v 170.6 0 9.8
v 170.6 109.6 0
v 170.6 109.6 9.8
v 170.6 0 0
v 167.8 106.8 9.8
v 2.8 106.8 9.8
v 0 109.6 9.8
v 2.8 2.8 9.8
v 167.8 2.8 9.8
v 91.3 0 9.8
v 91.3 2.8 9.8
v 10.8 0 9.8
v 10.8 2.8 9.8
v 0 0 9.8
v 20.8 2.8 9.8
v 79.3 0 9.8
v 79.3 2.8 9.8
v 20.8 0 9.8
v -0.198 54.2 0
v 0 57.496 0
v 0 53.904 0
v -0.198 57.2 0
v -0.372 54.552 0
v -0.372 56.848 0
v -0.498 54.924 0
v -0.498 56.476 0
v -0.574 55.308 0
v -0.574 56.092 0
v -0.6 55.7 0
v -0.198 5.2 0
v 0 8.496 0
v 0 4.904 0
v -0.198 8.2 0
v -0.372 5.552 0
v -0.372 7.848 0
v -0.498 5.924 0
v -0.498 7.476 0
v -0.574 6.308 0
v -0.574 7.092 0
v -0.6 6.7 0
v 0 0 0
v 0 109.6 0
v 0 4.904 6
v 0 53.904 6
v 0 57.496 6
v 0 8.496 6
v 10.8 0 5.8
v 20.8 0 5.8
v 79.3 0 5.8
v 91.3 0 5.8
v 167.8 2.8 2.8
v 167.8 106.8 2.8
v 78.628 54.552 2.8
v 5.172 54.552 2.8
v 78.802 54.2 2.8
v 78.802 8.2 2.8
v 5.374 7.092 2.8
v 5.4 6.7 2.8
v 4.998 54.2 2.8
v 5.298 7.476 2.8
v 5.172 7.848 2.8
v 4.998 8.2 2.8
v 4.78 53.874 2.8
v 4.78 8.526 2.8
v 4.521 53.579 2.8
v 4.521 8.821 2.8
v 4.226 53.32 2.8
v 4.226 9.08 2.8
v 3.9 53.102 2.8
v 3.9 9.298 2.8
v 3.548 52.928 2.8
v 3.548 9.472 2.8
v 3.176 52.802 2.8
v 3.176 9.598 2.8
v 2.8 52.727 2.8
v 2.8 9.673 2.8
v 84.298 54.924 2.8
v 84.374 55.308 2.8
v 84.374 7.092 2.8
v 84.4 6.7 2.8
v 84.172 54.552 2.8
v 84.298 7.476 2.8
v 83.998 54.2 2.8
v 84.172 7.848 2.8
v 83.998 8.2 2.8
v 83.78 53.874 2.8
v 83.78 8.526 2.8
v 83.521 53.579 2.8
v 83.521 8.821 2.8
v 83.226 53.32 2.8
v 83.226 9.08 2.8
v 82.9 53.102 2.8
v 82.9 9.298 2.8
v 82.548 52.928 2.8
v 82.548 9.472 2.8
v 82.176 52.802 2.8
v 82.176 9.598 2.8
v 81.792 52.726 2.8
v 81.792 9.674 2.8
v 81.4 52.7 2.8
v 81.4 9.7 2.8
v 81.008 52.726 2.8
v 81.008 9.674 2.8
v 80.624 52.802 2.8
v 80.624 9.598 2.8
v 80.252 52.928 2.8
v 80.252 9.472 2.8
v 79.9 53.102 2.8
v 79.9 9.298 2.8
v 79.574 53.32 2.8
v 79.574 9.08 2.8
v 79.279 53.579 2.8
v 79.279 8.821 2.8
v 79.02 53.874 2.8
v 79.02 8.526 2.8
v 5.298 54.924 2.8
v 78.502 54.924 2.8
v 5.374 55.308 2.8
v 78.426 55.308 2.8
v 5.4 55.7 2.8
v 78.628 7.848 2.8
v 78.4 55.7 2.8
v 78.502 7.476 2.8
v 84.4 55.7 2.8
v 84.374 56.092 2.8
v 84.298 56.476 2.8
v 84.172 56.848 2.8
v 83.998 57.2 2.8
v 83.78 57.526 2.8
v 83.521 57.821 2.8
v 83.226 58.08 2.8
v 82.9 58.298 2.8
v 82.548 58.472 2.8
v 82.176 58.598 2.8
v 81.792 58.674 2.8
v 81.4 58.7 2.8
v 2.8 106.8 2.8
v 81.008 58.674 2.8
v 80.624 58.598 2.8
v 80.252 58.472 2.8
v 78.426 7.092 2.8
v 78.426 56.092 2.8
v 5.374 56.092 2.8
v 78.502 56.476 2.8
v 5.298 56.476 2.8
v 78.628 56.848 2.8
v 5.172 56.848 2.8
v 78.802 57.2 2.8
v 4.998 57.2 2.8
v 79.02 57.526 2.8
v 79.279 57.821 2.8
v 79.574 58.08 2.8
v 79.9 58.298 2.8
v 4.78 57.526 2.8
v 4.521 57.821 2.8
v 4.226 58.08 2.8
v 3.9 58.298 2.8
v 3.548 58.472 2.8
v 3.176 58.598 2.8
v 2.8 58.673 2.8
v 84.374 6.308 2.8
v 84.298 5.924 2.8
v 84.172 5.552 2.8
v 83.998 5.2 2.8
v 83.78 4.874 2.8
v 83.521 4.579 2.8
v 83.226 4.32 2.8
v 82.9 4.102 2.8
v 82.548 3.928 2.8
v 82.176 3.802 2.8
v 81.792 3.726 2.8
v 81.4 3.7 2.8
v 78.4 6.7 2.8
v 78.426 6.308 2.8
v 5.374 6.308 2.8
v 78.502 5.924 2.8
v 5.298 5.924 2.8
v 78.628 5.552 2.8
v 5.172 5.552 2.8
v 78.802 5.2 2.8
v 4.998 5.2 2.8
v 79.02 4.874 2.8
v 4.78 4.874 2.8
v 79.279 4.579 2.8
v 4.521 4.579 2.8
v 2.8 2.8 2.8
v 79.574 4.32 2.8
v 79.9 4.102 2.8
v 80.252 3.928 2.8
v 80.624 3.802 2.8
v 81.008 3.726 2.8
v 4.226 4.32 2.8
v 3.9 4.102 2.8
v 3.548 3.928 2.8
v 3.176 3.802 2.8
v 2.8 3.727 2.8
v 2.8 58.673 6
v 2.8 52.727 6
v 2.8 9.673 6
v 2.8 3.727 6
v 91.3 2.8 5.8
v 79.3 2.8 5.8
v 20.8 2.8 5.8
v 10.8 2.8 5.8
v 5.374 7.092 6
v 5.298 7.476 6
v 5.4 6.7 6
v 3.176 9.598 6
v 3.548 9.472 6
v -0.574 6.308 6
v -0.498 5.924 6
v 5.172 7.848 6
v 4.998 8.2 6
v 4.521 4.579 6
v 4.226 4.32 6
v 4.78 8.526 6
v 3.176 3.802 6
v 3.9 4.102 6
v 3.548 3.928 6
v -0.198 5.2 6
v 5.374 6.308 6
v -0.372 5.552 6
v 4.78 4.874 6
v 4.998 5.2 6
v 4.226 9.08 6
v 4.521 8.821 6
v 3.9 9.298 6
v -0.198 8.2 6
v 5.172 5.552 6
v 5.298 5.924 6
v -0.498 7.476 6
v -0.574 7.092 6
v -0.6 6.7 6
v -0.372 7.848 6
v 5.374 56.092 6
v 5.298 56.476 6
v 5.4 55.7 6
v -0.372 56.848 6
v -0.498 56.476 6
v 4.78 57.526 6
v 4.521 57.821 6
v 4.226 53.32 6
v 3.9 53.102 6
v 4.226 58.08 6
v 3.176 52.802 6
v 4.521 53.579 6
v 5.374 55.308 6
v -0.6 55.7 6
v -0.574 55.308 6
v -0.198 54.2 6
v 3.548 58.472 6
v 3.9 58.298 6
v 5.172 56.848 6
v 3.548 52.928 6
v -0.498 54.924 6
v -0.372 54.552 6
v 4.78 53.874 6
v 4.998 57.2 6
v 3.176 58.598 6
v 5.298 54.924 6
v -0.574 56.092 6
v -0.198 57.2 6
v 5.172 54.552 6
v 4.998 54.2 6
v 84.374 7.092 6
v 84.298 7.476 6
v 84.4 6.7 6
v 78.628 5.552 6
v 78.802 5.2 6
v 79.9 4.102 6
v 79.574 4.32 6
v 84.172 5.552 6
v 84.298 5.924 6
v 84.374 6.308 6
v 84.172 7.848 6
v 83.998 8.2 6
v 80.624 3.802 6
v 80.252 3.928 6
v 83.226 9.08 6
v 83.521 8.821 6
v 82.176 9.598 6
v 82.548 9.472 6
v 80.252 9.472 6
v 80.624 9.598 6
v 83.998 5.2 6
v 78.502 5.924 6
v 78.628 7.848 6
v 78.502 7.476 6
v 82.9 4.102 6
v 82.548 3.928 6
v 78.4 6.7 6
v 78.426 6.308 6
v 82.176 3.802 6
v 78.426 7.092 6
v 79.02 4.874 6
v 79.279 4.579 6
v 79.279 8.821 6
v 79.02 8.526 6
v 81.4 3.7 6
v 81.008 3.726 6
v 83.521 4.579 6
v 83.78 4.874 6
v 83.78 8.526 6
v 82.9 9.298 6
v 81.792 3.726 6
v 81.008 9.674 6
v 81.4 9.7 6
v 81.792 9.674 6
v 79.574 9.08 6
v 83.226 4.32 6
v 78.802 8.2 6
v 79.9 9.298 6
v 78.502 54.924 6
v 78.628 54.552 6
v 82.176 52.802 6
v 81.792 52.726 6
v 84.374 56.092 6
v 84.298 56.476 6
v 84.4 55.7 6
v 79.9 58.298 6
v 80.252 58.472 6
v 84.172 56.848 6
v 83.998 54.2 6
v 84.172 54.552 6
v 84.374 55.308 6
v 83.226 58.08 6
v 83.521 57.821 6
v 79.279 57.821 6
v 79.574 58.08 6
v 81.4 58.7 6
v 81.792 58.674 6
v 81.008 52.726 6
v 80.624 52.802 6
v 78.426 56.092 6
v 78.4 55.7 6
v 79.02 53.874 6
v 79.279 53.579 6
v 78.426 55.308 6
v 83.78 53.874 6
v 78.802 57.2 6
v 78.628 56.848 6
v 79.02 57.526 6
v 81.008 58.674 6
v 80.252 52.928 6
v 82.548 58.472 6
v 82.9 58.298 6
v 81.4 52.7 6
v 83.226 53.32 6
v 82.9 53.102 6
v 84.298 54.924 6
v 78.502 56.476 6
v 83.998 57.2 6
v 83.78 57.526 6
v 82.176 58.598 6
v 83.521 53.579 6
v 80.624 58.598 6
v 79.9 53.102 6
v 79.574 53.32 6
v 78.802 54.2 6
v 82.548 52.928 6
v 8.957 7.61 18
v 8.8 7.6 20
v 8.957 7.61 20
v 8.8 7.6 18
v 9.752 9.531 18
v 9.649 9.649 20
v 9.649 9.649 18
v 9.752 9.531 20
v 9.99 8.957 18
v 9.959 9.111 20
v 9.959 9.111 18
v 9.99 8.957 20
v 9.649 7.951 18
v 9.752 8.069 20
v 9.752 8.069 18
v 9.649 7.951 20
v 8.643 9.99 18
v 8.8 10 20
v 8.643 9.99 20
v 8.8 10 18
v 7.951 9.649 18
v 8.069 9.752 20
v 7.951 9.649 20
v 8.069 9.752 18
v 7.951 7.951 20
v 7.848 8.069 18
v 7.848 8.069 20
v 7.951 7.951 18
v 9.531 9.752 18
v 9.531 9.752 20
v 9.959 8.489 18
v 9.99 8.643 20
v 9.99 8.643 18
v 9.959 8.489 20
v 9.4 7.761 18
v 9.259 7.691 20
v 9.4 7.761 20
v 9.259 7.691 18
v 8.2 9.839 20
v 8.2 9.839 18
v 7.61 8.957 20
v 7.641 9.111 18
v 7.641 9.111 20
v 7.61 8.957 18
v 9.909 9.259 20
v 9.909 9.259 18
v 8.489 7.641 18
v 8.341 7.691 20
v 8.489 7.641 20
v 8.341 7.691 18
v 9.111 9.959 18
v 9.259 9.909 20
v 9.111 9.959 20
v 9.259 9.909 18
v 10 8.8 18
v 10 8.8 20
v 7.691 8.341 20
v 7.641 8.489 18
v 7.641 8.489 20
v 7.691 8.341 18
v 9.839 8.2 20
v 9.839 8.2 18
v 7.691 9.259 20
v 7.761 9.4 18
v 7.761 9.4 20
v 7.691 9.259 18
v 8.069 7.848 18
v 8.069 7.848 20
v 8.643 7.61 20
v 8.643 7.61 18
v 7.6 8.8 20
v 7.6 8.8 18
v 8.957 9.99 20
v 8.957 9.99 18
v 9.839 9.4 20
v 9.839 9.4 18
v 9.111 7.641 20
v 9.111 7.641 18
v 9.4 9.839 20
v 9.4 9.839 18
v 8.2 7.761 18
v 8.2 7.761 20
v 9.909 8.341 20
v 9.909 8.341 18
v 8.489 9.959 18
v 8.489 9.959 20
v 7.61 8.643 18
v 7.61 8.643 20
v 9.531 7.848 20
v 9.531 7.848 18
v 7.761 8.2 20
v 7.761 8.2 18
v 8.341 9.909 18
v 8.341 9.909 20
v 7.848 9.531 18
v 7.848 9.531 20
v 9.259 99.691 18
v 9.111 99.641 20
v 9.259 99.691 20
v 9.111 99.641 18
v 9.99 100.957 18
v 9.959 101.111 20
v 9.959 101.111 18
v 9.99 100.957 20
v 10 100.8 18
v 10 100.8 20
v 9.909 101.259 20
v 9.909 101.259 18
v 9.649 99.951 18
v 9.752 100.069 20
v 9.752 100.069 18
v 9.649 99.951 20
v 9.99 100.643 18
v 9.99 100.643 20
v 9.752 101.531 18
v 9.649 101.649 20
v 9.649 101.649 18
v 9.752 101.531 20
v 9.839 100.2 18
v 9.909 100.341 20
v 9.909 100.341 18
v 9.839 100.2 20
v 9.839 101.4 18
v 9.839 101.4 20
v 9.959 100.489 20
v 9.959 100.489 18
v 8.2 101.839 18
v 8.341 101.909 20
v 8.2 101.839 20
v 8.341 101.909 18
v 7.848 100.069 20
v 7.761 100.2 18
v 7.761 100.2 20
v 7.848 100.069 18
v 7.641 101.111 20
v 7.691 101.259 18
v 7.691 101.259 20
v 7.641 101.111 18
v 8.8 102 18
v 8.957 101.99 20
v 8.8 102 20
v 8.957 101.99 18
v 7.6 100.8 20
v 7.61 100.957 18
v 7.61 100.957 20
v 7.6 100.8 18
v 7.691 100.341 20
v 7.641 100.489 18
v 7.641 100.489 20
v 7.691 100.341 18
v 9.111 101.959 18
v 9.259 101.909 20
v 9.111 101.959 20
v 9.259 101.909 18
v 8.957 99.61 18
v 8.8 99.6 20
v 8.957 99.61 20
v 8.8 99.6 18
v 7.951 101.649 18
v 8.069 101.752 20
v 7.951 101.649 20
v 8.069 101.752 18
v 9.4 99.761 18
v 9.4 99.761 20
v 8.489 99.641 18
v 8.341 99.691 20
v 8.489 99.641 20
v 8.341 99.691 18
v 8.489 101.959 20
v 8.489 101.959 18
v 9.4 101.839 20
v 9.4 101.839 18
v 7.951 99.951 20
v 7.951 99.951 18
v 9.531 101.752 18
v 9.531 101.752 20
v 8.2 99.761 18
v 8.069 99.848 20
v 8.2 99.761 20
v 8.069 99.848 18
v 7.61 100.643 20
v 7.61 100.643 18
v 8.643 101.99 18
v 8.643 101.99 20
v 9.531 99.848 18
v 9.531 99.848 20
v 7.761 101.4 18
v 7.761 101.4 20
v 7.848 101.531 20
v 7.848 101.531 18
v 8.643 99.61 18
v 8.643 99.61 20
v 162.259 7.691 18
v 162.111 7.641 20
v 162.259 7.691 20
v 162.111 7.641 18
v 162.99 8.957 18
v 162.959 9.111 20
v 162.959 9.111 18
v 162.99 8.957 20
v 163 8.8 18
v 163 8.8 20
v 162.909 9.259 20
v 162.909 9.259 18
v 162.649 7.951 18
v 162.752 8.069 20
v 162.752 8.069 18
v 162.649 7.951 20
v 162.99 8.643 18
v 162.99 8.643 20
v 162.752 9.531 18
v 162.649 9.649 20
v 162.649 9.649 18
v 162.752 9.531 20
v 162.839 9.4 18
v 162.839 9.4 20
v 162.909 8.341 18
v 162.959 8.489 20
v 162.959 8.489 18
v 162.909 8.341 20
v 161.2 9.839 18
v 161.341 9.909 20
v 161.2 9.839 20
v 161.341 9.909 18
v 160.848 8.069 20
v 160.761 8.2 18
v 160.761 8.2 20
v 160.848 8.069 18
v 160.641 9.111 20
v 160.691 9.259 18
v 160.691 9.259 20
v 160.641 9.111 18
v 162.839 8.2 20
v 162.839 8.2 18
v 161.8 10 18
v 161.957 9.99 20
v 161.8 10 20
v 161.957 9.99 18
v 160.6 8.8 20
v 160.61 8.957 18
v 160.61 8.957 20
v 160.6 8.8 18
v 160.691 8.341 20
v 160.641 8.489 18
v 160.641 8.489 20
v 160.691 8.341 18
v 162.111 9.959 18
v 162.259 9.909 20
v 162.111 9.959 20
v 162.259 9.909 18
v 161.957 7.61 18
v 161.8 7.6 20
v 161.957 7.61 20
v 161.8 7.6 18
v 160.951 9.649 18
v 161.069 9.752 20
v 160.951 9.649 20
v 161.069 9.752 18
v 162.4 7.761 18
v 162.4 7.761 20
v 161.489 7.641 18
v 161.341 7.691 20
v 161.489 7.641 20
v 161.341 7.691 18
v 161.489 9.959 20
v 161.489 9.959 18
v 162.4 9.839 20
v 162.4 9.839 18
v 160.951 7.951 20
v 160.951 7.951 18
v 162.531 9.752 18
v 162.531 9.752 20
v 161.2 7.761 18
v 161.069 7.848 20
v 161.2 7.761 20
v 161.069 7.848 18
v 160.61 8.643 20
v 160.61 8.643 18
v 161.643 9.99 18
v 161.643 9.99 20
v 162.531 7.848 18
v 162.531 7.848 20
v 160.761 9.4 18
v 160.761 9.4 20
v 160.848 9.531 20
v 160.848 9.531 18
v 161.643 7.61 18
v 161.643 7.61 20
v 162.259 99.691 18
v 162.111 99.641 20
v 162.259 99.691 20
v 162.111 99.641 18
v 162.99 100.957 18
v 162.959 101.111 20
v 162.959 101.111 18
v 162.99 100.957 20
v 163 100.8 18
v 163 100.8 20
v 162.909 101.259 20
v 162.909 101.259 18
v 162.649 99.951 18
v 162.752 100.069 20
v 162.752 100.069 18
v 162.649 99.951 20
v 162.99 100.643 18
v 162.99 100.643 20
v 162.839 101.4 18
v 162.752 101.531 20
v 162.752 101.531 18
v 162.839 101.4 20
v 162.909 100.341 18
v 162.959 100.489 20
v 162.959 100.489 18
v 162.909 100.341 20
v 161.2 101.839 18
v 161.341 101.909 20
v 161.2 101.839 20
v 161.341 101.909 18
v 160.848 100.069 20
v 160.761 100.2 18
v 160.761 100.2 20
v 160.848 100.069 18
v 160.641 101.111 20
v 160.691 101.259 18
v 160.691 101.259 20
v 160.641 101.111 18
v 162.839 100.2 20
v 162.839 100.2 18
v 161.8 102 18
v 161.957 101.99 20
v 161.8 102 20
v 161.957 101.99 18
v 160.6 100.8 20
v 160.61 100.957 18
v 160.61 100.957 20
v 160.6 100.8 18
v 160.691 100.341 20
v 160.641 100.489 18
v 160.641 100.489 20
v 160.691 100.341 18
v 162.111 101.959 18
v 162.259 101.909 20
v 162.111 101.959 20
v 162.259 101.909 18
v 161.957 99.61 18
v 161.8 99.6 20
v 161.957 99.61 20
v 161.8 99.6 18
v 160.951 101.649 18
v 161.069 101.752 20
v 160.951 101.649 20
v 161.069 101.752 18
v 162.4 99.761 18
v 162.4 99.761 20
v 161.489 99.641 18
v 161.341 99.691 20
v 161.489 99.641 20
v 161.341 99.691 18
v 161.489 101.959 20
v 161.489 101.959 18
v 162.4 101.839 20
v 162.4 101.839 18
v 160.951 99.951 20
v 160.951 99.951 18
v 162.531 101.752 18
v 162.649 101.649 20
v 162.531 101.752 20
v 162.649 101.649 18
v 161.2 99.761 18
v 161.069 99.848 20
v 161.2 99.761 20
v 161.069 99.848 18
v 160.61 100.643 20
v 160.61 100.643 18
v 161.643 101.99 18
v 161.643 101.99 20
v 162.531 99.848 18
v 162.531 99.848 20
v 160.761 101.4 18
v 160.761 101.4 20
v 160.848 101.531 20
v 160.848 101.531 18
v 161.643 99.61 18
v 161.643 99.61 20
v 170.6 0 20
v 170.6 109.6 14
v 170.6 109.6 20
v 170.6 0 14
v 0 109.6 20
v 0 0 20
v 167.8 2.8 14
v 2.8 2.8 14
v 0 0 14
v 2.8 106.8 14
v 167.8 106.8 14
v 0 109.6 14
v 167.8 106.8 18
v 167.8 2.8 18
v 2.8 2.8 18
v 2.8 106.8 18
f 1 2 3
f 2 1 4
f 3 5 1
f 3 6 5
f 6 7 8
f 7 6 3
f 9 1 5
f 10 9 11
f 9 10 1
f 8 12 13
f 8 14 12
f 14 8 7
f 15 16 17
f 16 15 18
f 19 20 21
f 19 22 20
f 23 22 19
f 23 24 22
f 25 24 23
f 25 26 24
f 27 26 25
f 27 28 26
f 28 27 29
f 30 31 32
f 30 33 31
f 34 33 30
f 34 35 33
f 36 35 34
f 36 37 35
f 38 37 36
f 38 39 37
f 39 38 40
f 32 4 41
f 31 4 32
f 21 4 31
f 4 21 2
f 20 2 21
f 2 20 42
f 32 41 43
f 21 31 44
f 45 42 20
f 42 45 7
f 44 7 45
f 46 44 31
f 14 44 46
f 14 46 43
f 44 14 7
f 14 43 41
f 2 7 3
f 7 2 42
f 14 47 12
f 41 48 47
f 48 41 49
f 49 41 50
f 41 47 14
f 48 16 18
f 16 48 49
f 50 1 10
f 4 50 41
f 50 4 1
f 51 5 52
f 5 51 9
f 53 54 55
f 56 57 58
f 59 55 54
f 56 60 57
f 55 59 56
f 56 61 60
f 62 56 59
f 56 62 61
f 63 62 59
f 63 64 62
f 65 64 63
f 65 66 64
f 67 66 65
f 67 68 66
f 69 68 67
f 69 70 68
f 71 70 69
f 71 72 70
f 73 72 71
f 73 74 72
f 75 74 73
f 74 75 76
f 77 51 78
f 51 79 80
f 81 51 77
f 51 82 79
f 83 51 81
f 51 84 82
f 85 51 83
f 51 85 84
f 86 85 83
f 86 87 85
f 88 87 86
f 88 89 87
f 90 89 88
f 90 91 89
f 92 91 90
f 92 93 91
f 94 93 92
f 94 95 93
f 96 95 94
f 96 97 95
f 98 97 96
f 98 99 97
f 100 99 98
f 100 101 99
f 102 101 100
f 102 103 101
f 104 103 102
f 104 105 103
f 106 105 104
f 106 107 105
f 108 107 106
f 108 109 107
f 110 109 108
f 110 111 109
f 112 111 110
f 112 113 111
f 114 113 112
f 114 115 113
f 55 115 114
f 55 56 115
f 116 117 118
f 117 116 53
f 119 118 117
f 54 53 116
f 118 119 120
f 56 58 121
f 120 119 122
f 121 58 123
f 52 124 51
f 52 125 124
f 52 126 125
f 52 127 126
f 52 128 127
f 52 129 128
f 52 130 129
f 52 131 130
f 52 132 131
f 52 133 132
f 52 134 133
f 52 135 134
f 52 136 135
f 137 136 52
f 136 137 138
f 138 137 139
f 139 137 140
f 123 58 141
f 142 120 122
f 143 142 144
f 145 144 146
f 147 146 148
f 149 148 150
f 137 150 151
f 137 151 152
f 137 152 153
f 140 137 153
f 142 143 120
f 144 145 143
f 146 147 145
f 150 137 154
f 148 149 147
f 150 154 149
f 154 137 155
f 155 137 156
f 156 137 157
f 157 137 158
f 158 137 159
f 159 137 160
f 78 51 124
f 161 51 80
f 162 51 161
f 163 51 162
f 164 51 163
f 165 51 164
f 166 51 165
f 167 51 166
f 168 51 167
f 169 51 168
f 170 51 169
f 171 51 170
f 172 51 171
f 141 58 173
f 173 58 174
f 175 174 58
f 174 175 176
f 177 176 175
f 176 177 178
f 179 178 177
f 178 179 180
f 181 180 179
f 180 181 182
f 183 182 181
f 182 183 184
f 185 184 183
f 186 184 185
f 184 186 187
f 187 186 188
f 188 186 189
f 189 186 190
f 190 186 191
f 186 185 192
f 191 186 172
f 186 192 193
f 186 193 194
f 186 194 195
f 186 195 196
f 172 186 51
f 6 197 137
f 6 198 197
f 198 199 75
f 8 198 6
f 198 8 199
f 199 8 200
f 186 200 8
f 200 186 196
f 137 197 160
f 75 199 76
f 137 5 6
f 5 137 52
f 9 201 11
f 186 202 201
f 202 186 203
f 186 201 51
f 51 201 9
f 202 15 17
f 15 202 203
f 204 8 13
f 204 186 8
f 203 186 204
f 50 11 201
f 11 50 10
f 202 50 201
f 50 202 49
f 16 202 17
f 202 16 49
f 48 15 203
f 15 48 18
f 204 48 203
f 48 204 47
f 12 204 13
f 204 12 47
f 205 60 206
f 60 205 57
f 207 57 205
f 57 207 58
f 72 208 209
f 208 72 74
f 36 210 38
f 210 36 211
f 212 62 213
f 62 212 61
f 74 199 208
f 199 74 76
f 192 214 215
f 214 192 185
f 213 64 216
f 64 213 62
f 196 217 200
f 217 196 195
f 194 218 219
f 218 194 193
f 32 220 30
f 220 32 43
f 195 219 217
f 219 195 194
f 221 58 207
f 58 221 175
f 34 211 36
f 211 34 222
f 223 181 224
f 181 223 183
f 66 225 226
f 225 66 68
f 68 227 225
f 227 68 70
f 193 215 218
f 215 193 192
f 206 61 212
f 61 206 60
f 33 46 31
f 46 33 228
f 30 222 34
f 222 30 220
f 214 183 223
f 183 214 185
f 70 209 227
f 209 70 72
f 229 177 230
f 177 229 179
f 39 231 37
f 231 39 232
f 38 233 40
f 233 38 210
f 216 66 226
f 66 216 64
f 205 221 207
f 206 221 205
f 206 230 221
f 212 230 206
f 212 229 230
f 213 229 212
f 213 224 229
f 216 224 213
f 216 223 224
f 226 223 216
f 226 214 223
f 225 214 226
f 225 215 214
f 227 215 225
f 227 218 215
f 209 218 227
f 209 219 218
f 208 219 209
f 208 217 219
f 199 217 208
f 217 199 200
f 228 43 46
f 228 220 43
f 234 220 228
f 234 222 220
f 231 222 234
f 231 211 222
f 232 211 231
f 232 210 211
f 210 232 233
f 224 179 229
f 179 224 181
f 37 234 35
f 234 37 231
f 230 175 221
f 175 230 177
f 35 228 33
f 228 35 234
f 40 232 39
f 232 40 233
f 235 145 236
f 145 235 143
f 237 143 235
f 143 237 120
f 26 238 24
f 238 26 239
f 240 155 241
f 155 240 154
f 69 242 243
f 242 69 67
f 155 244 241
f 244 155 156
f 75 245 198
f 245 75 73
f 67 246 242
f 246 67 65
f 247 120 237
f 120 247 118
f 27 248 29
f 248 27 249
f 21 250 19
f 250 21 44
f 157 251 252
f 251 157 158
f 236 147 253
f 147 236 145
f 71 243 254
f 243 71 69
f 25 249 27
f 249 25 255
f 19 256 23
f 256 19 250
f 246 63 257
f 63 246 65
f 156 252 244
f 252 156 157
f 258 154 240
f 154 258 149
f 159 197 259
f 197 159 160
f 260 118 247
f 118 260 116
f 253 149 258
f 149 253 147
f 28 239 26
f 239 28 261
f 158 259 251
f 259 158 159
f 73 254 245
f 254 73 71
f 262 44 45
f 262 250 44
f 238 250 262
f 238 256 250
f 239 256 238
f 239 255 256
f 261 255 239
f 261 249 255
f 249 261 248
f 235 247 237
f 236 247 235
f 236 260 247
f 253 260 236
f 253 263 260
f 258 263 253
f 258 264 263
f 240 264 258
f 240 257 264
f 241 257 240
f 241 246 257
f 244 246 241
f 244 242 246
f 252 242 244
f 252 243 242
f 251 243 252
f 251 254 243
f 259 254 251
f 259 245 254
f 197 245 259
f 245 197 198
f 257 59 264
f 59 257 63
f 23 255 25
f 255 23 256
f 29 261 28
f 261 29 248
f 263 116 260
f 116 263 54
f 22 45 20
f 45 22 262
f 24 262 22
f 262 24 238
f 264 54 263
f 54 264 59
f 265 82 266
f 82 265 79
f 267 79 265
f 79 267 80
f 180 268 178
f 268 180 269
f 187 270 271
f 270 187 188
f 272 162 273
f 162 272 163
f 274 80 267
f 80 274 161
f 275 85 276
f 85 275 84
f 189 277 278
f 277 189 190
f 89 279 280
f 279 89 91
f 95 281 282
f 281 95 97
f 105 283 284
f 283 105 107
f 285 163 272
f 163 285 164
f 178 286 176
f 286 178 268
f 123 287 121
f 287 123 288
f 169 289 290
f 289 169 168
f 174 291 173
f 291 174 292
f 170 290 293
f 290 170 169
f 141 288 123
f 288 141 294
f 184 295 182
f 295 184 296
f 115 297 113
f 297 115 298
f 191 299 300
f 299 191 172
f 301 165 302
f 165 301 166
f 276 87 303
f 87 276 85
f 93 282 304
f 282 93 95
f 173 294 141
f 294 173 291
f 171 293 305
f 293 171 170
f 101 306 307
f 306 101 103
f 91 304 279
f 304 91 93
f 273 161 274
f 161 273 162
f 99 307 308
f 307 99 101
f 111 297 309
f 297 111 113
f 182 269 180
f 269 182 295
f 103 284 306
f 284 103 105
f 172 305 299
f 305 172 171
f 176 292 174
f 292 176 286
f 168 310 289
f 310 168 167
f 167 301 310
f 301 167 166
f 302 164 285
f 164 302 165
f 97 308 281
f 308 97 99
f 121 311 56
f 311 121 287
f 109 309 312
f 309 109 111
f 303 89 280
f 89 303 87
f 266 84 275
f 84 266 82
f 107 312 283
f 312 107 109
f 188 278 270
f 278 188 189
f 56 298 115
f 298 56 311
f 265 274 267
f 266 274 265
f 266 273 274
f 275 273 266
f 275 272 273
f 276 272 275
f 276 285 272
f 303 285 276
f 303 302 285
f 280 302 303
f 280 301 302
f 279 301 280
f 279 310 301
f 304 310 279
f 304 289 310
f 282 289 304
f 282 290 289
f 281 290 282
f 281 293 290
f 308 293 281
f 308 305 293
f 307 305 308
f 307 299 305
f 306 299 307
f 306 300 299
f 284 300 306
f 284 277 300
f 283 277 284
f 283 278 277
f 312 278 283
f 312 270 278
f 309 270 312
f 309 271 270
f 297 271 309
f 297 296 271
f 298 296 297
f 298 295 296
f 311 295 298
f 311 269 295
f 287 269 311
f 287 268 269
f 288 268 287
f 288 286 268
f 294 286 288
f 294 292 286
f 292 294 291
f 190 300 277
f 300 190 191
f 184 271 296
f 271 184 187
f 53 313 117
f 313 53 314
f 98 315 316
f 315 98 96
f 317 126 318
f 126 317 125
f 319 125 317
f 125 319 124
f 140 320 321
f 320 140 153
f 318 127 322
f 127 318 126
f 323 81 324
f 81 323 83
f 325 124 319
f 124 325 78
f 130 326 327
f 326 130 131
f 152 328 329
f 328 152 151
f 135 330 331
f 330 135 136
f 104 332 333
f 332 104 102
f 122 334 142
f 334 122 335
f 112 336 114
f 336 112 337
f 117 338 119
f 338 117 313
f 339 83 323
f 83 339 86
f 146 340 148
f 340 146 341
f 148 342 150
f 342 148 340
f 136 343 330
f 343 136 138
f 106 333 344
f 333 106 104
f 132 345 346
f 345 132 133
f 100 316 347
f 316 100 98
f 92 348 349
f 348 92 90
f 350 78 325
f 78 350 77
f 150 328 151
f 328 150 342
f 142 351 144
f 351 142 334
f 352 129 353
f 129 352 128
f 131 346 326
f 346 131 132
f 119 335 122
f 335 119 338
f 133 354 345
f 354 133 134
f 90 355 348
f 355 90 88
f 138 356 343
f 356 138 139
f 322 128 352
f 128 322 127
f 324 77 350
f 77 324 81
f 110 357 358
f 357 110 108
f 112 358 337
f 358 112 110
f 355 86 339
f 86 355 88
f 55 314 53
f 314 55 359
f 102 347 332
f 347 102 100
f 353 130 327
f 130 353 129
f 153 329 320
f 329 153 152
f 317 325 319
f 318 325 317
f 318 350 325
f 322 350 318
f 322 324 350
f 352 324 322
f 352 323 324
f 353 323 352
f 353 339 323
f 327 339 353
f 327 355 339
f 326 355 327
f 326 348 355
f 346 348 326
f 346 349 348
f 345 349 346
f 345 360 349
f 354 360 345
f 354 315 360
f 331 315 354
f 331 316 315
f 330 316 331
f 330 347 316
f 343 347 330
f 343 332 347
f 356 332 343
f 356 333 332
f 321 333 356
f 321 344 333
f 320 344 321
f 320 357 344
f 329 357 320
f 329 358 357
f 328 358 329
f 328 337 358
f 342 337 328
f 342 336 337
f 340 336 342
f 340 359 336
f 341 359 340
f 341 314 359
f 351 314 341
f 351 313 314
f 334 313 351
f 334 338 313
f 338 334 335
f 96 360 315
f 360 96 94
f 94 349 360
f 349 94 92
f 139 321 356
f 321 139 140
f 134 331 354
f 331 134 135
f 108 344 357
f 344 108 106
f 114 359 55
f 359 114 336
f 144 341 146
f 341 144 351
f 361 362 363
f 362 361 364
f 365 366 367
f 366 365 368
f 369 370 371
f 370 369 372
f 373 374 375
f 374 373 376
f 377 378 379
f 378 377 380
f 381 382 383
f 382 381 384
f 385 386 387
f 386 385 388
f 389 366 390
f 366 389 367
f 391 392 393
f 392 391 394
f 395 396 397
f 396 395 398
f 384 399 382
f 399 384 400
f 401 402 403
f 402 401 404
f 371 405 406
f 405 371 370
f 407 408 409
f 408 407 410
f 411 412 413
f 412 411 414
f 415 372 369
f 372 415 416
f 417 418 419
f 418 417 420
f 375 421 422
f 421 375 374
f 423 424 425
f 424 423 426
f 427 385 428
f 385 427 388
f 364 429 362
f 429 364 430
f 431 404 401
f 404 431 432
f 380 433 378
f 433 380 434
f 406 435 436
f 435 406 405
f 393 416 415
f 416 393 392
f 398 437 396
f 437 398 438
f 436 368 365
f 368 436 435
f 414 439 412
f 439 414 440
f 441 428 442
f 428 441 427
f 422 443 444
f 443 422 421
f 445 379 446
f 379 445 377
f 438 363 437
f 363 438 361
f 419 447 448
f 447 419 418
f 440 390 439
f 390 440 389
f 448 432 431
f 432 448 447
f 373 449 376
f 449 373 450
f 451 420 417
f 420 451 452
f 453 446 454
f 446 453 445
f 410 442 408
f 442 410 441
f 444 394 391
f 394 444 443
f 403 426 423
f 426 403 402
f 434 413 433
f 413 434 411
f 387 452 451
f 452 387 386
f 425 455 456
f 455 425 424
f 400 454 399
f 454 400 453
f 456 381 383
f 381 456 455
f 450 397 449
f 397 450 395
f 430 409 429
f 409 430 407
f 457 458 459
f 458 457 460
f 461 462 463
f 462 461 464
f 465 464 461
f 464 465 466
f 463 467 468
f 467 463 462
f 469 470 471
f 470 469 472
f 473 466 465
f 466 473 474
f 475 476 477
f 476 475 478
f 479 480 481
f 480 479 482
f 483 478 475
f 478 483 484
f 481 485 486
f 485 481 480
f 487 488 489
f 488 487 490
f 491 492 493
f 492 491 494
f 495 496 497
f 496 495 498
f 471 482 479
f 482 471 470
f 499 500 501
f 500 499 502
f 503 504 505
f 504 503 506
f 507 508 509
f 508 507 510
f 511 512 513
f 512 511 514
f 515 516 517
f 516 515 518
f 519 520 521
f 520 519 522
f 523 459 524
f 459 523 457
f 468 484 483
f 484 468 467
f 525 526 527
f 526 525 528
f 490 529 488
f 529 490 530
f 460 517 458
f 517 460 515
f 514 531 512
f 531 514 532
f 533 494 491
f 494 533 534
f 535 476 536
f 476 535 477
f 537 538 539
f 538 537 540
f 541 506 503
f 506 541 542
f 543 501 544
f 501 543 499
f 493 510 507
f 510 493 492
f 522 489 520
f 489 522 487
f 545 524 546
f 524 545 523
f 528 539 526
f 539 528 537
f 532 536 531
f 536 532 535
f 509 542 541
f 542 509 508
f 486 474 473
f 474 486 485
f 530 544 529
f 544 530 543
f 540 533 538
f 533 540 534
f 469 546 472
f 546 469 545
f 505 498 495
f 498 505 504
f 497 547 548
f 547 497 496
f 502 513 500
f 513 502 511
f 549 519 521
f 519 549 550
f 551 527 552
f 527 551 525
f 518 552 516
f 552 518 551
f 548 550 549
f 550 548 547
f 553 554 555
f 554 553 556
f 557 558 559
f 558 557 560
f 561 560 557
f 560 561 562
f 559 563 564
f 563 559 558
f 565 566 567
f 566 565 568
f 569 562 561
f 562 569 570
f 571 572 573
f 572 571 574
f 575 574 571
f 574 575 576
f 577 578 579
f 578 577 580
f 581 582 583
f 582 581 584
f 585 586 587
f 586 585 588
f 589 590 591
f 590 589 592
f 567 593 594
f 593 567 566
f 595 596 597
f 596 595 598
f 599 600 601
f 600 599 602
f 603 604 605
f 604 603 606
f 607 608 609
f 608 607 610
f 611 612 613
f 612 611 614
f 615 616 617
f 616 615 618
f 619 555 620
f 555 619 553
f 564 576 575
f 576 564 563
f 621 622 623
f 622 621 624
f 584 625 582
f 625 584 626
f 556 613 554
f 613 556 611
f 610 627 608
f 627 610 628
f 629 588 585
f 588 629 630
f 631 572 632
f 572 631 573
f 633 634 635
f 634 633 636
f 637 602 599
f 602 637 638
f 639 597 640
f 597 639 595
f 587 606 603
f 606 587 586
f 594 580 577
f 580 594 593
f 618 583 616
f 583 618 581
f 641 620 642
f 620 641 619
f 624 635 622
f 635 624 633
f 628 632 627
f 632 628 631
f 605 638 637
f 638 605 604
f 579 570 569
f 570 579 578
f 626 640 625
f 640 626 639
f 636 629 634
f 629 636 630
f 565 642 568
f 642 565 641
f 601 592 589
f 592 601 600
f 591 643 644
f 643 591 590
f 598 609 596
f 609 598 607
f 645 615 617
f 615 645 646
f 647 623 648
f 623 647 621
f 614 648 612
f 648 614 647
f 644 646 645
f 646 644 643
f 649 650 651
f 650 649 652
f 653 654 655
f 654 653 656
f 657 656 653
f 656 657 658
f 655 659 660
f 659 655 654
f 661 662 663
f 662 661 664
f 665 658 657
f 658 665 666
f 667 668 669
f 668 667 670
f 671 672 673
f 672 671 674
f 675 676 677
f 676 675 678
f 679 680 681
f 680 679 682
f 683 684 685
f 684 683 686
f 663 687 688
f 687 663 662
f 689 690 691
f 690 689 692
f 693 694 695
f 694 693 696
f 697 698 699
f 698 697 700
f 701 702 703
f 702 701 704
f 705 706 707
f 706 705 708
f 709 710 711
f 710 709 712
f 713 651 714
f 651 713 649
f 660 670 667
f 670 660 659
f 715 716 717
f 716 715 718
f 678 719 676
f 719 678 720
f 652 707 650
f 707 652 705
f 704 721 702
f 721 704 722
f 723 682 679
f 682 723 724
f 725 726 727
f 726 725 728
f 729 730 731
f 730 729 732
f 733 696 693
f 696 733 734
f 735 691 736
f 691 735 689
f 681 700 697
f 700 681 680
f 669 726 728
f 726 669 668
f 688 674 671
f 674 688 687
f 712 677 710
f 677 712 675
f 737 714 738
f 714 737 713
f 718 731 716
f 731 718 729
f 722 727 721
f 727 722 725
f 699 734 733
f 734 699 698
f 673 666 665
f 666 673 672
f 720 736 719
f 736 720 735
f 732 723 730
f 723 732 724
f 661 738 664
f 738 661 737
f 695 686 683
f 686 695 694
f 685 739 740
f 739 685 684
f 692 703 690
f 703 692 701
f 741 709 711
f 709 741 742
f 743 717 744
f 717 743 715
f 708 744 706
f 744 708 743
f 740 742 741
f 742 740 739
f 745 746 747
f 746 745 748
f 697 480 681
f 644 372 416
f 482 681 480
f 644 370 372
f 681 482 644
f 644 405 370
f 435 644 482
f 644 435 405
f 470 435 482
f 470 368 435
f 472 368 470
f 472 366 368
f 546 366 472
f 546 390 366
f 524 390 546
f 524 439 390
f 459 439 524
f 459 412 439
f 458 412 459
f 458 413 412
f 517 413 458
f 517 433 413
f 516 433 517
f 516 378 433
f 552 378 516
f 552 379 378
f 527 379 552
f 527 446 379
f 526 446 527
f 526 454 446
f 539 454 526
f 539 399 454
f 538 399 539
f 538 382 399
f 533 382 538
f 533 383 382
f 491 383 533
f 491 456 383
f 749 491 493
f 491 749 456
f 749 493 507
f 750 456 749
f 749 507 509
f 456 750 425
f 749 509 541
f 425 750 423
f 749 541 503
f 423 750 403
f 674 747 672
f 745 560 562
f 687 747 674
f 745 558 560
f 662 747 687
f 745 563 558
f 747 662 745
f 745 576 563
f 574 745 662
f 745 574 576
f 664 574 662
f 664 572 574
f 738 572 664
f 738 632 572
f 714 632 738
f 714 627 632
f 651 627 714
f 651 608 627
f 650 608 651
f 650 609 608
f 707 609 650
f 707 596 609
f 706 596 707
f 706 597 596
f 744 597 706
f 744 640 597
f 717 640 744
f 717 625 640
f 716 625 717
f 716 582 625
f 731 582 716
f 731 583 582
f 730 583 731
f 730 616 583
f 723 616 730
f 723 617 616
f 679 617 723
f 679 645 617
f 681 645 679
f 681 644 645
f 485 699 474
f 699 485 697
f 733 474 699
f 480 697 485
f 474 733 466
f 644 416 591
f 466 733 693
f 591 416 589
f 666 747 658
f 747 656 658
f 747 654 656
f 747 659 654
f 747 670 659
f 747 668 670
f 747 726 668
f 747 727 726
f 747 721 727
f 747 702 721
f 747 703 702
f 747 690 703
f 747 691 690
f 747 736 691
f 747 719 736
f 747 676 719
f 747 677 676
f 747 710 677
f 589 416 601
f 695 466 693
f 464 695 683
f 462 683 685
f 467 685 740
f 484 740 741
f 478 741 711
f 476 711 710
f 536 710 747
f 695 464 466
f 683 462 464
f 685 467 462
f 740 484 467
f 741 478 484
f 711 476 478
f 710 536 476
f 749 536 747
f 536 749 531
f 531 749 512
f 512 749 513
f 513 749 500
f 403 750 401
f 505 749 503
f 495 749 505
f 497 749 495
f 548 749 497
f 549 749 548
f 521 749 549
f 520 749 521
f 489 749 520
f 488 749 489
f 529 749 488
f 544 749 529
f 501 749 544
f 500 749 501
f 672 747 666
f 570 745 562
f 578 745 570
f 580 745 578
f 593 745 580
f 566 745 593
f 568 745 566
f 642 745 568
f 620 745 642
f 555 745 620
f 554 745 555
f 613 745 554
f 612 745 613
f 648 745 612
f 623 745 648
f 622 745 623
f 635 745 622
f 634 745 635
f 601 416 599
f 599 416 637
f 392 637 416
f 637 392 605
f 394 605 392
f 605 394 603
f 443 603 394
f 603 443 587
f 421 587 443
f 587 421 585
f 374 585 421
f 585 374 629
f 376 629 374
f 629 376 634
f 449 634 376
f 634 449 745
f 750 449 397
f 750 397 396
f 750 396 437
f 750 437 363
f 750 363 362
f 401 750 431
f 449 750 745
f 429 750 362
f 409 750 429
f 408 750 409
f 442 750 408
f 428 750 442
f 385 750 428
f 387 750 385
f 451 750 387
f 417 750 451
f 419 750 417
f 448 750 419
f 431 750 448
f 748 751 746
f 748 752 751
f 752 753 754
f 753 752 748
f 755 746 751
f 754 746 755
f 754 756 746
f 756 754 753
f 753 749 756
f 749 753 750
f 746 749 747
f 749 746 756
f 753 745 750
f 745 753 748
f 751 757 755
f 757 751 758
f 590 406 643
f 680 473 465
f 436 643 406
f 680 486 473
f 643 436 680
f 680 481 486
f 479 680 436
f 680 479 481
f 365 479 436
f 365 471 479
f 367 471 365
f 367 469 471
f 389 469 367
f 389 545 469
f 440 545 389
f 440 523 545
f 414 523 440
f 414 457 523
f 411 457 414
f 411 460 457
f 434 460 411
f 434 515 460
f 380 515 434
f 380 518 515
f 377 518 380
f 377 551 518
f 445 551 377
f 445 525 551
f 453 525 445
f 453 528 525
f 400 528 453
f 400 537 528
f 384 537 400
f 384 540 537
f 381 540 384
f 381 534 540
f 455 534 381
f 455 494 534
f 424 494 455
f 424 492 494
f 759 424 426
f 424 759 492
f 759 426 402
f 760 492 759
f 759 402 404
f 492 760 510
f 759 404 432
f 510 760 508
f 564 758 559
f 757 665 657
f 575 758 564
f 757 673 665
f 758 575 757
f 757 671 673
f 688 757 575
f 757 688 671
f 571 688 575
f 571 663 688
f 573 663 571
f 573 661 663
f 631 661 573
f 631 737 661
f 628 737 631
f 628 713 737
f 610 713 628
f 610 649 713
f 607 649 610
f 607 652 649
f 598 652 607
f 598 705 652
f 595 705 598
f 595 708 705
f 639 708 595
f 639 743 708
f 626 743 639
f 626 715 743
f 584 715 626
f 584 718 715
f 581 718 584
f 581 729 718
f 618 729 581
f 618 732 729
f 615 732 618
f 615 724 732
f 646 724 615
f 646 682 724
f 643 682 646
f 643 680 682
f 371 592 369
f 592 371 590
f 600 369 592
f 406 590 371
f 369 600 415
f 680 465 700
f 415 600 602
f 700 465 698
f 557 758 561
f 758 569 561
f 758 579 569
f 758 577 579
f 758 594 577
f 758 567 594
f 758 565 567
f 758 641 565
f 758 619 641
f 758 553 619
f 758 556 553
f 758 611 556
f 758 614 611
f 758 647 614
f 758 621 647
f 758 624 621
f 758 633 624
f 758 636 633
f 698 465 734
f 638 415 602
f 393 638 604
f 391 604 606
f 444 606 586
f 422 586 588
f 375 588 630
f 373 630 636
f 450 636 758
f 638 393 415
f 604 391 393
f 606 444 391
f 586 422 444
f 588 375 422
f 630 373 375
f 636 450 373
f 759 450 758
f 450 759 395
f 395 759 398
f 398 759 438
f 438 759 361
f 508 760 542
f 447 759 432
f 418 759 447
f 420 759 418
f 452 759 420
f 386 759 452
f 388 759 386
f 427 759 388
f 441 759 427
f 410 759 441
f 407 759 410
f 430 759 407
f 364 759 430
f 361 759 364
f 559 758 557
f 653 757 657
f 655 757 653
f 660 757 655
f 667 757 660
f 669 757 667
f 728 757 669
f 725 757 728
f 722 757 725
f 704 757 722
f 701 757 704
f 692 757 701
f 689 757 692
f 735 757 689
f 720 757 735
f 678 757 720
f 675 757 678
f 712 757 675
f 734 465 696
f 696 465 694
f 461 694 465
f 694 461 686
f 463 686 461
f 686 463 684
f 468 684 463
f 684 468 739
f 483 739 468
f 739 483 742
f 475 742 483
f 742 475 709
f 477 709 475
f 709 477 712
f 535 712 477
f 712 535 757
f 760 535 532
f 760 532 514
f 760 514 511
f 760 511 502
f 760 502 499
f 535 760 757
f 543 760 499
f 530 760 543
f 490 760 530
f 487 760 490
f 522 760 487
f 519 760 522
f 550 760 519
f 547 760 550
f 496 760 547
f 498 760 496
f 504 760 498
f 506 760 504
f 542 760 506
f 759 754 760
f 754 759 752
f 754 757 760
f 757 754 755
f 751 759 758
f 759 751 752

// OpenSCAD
// file: monitor-rock5c-holder.scad
// monitor-rock5c-holder.scad
// Integrated monitor holder + Radxa Rock 5C enclosure
// Parametric so measured screen holes drop straight in.
// part = "coupon" | "backplate" | "bezel" | "preview"
//
// Verified: Rock 5C board 86 x 56mm.
// Screen (HMTECH 7" 800x480): outer ~165 x 104mm, active ~154x86.
//   Outer dims / corner hole positions are GENERIC placeholders pending
//   physical measurement of the actual board.

PART = "preview";          // "coupon" | "backplate" | "bezel" | "preview"

// ---------- Screen (7" HMTECH 800x480) ----------
sc_w  = 165;               // board outer width  (VERIFY against real board)
sc_h  = 104;               // board outer height (VERIFY against real board)
sc_t  = 7;                 // LCD+PCB thickness
sc_hole_d = 2.4;           // board mounting hole dia (M2 screw, generic)
sc_hole_inset = 6;         // hole center inset from board corner (VERIFY)
sc_active_w = 154;         // active display width
sc_active_h = 86;          // active display height

// ---------- Rock 5C ----------
rk_w = 86;
rk_h = 56;
rk_t = 1.6;                // PCB thickness
rk_standoff_h = 6;         // standoff height above backplate floor
rk_screw_d = 2.4;          // M2 through board

// ---------- Enclosure ----------
wall   = 2.8;
bezel_w = 6;               // bezel frame lip around screen edge
total_t = sc_t + wall;     // backplate floor to bezel front

// Clearances
fit = 0.4;                 // general fit gap for parts that drop in

// ---------- Rock 5C pocket (on backplate) ----------
pkt_inset_x = 6;           // pocket position on backplate (from screen bottom edge)
pkt_w = rk_w + fit*2;
pkt_h = rk_h + fit*2;
pkt_depth = rk_t + rk_standoff_h;
// Pocket sits fully inside the plate: its bottom edge aligns at wall,
// so the whole 56.8mm-tall pocket (and its standoffs) stay in-bounds.
pkt_cx = wall + (sc_w - pkt_w)/2;
pkt_cy = wall + pkt_h/2;

// M2.5 standoffs for the Rock 5C (per Hive convention: 2.1mm pilots, thread-forming)
standoff_d = 6;
standoff_pilot = 2.1;
// Rock 5C mounting holes (typical M2, ~4mm from each edge) - VERIFY
rk_hole_pos = 3.5;

$fn = 48;

// ============================================================
module screen_board(extra=0) {
    // the 7" screen PCB as a simple block (dummy for layout)
    translate([0,0,-sc_t])
      cube([sc_w+extra, sc_h+extra, sc_t], center=true);
}

module rock5c_holes() {
    // 4 mounting holes at corners of Rock 5C
    for (sx=[-1,1], sy=[-1,1])
      translate([sx*(rk_w/2 - rk_hole_pos), sy*(rk_h/2 - rk_hole_pos), 0])
        cylinder(d=rk_screw_d, h=pkt_depth+2, center=true);
}

// ============================================================
// FIT COUPON: verify screen board + Rock 5C actually sit in the pockets
// before committing to the full case. Two pockets + corner hole markers.
module coupon() {
    difference() {
        // plate: screen pocket on top half, Rock 5C pocket on bottom half
        cube([sc_w+20, sc_h+20, 4]);
        // screen pocket (trace) - top
        translate([10,10,1.5])
          cube([sc_w+fit, sc_h+fit, 3]);
        // rock5c pocket (trace) - bottom
        translate([10, 10+sc_h+8, 1.5])
          cube([rk_w+fit, rk_h+fit, 3]);
        // corner hole markers for the screen (drill points)
        for (sx=[0,1], sy=[0,1])
          translate([10+ (sx? sc_w : 0) + sx*(sc_hole_inset) , 10+(sy? sc_h:0)+sy*(sc_hole_inset), 0])
            cylinder(d=sc_hole_d, h=4, center=true);
        // rock5c mounting hole markers
        for (sx=[-1,1], sy=[-1,1])
          translate([10+sc_w/2+sx*(rk_w/2-rk_hole_pos), 10+sc_h+8+rk_h/2+sy*(rk_h/2-rk_hole_pos), 0])
            cylinder(d=rk_screw_d, h=4, center=true);
    }
}

// ============================================================
// BACKPLATE: mounts Rock 5C + cable pass-throughs. Screen faces forward.
module backplate() {
    difference() {
        // outer backplate shell (screen side open)
        cube([sc_w+2*wall, sc_h+2*wall, sc_t+wall]);
        // inner cavity: screen board drops in from front
        translate([wall, wall, wall])
          cube([sc_w, sc_h, sc_t+1]);
        // Rock 5C pocket recessed into backplate floor (bottom end)
        translate([pkt_cx, pkt_cy, wall])
          cube([pkt_w, pkt_h, pkt_depth]);
        // cable pass-throughs: HDMI + USB-C/power (top end, behind screen top)
        // HDMI (center, ~12mm wide)
        translate([(sc_w+2*wall)/2 - 6, -1, wall+3])
          cube([12, wall+2, 10]);
        // power/data (offset to one side)
        translate([wall+8, -1, wall+3])
          cube([10, wall+2, 10]);
        // Rock 5C mounting holes through backplate
        translate([pkt_cx, pkt_cy, 0])
          rock5c_holes();
    }
    // Rock 5C standoffs (on floor of pocket)
    // Extend DOWN into the floor material (past the wall plane) so each
    // cylinder merges with the base — otherwise it floats as a loose shell.
    translate([pkt_cx, pkt_cy, 0])
      for (sx=[-1,1], sy=[-1,1])
        translate([sx*(rk_w/2-rk_hole_pos), sy*(rk_h/2-rk_hole_pos), 0])
          cylinder(d=standoff_d, h=rk_standoff_h);
}

// ============================================================
// BEZEL: front frame that holds the screen against the backplate.
module bezel() {
    difference() {
        // outer frame
        cube([sc_w+2*wall, sc_h+2*wall, bezel_w]);
        // active-area window
        translate([(sc_w+2*wall)/2, (sc_h+2*wall)/2, -1])
          cube([sc_active_w, sc_active_h, bezel_w+2], center=true);
        // board recess lip (screw the board to the frame)
        translate([wall, wall, 0])
          cube([sc_w, sc_h, bezel_w-2]);
        // screen mounting holes (4 corners) - thread into bezel
        for (sx=[0,1], sy=[0,1])
          translate([wall + (sx? sc_w-sc_hole_inset : sc_hole_inset),
                     wall + (sy? sc_h-sc_hole_inset : sc_hole_inset), -1])
            cylinder(d=sc_hole_d, h=bezel_w+2);
    }
}

// ============================================================
if (PART == "coupon") coupon();
else if (PART == "backplate") backplate();
else if (PART == "bezel") bezel();
else if (PART == "preview") {
    // assemble for preview only
    color("white") backplate();
    translate([0,0,sc_t+wall]) color("silver") bezel();
    color("green") screen_board();
    translate([pkt_cx, pkt_cy, wall])
      color("darkgreen") cube([rk_w, rk_h, rk_t], center=false);
}
// main file
// monitor-rock5c-holder-preview.scad
// Two-tone render matching on-shelf filament: backplate BLACK, bezel WHITE.
// For preview only — printable parts come from monitor-rock5c-holder.scad.
use <monitor-rock5c-holder.scad>
backplate();
translate([0,0,14]) color("#f2f2f2") bezel();   // sc_t(7)+wall(2.8) ~ 9.8; 14 opens gap to see both
